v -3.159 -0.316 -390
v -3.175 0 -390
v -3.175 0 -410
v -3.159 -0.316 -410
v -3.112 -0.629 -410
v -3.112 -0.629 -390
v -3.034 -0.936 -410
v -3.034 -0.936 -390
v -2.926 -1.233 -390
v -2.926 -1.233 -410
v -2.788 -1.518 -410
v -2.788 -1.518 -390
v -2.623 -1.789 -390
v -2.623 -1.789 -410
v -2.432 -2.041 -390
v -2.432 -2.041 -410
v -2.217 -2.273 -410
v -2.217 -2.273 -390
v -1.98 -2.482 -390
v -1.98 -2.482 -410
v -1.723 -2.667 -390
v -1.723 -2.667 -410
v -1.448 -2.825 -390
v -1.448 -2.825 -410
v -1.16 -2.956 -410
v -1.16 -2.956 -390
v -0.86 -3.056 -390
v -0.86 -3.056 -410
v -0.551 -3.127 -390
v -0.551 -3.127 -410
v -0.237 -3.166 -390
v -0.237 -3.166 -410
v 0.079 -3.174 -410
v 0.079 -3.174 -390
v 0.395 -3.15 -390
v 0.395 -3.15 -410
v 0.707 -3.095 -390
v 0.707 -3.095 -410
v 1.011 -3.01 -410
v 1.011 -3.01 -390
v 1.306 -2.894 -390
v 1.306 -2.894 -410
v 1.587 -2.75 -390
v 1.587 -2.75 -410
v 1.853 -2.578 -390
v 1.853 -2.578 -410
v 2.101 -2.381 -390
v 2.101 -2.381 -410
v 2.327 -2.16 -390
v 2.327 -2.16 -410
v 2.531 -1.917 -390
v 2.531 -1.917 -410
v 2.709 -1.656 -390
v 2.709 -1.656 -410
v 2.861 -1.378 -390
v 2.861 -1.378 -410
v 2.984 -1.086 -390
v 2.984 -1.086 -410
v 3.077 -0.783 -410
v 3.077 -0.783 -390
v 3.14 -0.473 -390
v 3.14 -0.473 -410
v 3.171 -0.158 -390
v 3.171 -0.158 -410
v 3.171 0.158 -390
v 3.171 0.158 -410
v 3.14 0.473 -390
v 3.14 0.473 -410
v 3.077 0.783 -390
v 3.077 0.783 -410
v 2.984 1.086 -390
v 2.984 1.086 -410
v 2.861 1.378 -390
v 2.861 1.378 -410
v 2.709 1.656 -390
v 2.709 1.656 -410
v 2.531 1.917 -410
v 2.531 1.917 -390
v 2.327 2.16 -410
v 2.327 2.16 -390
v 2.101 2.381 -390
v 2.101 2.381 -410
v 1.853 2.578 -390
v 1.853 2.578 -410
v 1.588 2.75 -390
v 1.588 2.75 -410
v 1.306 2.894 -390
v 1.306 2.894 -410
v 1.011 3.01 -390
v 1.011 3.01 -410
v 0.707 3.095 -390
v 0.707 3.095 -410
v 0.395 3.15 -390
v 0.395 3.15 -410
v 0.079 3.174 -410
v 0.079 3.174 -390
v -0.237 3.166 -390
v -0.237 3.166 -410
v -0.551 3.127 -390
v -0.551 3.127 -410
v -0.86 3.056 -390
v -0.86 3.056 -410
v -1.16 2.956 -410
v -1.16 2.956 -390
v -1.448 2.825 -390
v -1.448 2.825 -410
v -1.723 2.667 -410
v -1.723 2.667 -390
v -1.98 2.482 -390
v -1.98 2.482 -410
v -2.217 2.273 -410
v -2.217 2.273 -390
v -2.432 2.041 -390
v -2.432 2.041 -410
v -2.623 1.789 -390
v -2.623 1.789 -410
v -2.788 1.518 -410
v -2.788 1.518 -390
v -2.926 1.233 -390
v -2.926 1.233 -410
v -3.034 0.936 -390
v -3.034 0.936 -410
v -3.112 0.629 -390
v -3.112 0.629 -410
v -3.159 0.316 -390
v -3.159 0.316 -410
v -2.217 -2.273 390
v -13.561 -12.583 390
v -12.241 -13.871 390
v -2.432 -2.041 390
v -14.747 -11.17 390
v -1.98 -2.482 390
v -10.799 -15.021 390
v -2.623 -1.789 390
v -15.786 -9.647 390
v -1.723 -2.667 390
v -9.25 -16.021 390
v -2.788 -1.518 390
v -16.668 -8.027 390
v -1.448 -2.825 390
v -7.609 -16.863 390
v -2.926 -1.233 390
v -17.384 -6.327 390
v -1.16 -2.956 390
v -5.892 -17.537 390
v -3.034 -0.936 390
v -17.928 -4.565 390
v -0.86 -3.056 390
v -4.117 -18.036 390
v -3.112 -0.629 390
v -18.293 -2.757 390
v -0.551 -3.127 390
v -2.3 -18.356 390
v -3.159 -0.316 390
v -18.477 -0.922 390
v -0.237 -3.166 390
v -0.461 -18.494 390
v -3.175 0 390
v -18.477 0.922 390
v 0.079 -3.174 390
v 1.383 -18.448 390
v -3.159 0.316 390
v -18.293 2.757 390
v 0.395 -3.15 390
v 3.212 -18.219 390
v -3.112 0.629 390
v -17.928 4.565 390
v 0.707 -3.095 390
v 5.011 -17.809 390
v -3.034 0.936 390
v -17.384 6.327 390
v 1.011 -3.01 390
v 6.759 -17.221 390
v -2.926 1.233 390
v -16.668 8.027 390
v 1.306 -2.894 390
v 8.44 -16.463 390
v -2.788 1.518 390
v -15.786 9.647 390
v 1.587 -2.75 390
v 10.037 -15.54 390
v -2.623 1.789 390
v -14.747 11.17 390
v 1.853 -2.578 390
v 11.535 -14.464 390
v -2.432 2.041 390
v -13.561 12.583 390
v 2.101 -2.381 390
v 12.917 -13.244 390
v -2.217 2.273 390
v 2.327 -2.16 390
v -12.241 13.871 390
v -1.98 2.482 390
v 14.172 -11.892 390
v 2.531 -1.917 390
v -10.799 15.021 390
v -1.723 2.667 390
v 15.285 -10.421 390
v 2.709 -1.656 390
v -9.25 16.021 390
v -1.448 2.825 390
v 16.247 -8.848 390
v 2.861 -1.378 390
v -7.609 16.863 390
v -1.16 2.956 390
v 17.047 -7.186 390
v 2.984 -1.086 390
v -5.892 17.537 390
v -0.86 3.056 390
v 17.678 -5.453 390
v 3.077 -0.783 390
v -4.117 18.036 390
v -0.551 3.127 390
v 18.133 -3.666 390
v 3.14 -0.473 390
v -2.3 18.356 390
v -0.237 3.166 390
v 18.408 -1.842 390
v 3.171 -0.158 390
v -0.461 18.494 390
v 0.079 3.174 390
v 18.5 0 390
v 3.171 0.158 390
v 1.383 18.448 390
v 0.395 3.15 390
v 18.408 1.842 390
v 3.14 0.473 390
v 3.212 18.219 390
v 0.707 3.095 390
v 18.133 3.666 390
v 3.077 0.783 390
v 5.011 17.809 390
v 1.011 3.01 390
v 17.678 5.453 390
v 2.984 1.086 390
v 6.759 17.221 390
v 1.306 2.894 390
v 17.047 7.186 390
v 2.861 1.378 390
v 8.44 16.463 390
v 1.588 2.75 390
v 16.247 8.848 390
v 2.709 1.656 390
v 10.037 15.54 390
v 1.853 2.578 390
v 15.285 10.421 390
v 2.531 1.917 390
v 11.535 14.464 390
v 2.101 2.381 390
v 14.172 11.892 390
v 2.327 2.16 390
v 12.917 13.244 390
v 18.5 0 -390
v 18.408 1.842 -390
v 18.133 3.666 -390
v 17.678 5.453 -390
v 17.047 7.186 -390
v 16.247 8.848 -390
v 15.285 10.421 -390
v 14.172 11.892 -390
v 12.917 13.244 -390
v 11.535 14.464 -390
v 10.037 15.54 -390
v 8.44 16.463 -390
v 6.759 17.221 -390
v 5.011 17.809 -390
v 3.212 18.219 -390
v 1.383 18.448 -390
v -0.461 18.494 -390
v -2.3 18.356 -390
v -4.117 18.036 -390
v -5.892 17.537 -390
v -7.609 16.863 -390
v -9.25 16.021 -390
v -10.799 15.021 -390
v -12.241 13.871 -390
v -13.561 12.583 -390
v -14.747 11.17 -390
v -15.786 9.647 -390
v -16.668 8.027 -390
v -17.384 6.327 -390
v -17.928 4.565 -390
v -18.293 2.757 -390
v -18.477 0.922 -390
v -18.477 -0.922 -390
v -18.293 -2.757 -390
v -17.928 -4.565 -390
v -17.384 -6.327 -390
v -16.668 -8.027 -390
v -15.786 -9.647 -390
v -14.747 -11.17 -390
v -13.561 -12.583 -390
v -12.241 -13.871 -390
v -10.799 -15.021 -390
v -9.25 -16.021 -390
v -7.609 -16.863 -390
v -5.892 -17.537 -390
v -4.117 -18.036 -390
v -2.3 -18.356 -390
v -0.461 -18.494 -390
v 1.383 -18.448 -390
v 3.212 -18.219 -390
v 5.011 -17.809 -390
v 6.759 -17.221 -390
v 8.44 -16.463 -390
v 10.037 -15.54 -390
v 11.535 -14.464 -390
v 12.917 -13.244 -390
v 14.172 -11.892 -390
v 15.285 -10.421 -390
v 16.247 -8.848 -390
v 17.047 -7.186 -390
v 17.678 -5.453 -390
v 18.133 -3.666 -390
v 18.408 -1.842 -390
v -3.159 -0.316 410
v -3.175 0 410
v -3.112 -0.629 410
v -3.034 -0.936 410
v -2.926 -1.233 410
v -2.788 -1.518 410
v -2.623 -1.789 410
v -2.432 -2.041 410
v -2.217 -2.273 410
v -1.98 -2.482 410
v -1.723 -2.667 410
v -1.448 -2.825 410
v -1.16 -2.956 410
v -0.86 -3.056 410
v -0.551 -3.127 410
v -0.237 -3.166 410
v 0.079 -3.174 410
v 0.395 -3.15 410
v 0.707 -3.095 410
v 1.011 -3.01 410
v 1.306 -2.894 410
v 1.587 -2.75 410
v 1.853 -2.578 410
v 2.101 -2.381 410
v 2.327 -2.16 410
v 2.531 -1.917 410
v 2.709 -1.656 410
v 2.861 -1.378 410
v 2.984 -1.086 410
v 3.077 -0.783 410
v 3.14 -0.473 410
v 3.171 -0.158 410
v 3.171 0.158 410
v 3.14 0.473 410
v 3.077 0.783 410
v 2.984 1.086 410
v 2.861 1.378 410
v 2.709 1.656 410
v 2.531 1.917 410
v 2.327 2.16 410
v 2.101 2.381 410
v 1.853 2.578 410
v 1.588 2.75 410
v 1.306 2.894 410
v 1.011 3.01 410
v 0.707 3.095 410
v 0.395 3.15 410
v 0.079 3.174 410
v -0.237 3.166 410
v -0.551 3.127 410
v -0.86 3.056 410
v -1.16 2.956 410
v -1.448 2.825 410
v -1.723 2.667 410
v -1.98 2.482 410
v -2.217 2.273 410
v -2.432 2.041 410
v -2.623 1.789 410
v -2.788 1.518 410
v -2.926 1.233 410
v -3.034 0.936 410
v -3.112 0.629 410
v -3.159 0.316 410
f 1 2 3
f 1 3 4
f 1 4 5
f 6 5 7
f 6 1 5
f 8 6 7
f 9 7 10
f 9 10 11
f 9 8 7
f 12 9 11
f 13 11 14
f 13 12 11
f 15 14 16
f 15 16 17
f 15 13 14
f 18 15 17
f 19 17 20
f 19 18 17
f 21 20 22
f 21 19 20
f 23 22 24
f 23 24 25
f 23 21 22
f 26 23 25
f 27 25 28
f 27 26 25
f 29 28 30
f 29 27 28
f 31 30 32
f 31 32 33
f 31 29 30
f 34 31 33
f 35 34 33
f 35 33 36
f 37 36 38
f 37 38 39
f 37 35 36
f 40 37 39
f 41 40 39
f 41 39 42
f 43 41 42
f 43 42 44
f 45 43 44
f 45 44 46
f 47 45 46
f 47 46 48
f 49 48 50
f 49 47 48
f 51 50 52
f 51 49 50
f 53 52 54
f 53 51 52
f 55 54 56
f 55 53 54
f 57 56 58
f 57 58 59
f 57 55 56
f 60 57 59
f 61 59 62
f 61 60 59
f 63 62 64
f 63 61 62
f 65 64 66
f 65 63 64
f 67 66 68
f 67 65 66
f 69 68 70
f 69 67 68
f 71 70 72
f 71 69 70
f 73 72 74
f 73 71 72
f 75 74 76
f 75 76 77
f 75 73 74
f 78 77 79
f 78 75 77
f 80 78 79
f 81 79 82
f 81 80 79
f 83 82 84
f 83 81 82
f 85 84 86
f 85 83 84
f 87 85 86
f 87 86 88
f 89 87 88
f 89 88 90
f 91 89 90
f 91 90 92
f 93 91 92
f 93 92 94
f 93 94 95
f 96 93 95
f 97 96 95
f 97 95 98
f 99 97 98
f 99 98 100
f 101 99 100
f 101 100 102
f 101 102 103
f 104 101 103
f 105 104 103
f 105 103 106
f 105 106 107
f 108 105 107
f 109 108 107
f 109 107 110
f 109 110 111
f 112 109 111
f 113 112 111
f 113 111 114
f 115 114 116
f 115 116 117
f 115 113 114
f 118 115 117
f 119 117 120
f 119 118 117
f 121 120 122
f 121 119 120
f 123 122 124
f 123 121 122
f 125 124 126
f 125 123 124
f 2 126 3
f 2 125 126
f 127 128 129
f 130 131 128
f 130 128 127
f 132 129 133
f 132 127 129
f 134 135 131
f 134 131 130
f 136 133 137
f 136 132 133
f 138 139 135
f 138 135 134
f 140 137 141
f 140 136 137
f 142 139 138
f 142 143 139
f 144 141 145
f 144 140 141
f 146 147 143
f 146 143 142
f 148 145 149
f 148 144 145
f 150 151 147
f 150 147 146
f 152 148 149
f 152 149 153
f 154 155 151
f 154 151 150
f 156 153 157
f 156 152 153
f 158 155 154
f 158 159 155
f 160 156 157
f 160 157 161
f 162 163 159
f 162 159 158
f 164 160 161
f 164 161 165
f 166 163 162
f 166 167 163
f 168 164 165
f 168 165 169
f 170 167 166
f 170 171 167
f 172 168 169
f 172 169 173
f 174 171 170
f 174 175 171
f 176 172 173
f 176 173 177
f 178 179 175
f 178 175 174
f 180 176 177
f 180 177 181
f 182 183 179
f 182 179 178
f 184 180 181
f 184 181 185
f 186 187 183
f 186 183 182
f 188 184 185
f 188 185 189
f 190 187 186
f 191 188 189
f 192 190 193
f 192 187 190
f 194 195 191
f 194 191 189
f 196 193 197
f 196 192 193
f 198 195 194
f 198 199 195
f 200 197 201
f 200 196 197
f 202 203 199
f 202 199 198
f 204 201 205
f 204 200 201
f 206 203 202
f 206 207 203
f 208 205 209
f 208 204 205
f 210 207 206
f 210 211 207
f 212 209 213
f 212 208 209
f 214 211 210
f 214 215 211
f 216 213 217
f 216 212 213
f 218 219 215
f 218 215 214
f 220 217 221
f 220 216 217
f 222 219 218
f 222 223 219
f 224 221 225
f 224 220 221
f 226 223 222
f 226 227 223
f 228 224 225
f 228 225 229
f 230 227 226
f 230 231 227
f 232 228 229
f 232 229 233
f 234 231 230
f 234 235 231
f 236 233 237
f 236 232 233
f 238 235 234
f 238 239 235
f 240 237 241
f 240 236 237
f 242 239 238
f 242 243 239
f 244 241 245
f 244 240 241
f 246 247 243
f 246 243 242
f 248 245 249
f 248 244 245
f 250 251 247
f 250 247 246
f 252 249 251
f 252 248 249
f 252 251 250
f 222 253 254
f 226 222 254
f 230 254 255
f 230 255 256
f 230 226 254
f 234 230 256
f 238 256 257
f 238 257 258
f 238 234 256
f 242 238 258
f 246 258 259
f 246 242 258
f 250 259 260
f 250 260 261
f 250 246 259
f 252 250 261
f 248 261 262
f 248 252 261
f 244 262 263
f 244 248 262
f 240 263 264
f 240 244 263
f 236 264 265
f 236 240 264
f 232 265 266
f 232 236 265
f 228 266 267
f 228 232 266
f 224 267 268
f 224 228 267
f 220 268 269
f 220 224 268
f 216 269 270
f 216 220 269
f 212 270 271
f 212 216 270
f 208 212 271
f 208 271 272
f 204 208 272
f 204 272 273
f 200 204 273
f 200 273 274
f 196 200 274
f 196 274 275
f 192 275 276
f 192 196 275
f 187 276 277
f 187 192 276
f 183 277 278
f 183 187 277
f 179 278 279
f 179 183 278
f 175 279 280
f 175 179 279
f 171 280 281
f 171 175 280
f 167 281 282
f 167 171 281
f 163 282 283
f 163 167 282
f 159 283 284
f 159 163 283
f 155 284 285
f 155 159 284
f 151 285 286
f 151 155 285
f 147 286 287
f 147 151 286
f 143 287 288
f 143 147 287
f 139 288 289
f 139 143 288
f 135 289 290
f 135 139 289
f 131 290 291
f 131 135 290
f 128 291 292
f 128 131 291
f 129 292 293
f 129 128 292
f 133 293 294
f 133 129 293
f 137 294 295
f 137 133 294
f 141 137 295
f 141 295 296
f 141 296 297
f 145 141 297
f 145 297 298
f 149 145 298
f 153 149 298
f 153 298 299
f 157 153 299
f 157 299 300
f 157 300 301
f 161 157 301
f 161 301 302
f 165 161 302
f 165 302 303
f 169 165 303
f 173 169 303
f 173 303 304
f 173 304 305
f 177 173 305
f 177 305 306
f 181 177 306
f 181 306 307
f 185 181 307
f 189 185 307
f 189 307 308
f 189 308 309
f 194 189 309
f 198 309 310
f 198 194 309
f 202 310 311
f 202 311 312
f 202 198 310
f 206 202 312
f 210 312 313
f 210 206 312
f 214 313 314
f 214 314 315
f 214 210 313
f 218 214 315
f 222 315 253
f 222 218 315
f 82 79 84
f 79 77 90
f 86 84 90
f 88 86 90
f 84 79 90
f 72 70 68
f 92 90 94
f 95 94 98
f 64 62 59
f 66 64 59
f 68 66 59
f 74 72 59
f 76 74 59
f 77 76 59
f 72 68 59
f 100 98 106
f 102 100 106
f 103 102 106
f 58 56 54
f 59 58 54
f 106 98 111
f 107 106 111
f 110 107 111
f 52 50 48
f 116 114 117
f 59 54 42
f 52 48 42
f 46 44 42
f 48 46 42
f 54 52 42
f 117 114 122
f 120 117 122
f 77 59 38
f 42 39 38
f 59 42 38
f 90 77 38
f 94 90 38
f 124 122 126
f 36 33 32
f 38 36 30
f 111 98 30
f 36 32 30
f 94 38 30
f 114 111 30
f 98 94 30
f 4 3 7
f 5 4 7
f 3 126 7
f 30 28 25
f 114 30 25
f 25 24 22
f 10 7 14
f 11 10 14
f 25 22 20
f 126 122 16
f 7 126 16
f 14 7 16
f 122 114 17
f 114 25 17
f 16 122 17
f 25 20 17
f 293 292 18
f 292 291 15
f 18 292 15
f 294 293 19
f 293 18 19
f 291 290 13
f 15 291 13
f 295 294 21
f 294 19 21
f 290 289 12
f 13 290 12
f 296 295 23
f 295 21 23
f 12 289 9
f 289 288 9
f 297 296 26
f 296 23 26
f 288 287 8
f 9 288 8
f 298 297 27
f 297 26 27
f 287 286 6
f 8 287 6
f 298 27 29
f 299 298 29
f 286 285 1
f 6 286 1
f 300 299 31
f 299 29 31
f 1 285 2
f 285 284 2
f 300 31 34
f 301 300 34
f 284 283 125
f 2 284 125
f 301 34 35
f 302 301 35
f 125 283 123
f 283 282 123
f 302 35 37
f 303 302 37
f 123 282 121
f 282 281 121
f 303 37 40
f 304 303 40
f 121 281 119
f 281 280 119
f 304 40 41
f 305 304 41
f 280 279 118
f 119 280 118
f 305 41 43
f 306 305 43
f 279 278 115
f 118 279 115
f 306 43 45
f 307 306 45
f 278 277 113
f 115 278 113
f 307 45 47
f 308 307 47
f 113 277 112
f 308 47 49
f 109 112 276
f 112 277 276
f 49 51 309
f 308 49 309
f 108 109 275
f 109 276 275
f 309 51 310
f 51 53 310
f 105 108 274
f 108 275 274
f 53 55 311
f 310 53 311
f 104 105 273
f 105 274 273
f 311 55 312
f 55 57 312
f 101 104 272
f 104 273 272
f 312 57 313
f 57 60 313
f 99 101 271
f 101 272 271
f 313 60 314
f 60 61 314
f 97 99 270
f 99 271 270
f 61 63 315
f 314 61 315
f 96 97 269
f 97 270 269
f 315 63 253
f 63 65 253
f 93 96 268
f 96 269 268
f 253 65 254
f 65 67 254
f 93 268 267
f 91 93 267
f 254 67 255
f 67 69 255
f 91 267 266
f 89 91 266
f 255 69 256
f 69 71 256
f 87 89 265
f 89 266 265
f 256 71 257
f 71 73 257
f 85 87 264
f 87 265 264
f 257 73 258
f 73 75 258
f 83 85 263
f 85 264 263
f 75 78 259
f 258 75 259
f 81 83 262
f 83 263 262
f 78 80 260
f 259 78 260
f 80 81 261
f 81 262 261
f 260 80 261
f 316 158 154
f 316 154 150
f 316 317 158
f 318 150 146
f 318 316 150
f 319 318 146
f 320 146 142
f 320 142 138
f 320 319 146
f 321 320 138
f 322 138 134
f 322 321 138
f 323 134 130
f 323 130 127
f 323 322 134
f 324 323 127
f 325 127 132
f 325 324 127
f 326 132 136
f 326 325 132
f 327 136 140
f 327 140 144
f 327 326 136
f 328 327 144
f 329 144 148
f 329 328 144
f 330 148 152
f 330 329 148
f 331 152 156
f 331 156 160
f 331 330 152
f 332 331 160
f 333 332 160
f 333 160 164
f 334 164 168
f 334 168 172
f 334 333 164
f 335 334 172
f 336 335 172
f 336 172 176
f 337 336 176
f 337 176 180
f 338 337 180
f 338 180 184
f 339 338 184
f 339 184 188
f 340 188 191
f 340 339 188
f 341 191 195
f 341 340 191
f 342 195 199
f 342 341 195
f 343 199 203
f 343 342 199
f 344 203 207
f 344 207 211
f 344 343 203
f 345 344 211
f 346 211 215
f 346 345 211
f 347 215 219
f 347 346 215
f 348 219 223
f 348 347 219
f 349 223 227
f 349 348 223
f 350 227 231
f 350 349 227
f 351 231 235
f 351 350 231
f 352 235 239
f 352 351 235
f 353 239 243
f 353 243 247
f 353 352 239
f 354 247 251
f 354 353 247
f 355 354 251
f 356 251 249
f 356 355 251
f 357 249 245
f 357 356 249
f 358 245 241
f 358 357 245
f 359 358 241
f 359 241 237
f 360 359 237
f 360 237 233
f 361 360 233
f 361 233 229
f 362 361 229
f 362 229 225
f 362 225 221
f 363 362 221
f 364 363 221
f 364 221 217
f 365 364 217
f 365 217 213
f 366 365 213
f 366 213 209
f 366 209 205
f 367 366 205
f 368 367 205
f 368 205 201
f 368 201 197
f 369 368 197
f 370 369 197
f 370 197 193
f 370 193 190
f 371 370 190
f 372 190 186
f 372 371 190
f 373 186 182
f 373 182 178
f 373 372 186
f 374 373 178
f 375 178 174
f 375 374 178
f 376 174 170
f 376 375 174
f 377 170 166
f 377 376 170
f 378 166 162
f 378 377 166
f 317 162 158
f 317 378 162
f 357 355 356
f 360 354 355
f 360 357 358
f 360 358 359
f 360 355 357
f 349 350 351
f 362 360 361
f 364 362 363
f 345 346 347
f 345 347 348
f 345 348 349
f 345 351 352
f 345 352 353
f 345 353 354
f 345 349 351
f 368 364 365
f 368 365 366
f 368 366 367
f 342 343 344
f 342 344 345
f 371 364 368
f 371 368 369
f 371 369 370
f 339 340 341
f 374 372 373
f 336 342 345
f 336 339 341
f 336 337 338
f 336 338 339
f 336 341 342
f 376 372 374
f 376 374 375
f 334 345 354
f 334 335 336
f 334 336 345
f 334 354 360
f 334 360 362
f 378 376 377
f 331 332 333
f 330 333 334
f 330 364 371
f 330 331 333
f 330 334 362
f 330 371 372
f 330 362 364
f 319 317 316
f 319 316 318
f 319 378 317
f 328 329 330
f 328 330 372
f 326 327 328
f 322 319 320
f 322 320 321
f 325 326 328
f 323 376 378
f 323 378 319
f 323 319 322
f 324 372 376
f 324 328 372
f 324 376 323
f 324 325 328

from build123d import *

# Parameters (mm, degrees)
SKETCH1_R           = 18.5
BOSS_EXTRUDE1_DEPTH = 390
SKETCH2_R           = 3.175
BOSS_EXTRUDE2_DEPTH = 410


with BuildPart() as part:
    # Sketch1 → Boss-Extrude1 (new, symmetric)
    with BuildSketch(Plane.XY):
        Circle(SKETCH1_R)
    extrude(amount=BOSS_EXTRUDE1_DEPTH, both=True)

    # Sketch2 → Boss-Extrude2 (add, symmetric)
    with BuildSketch(Plane.XY):
        with Locations(Location((0, 0, 0), (0, 0, 180))):
            Circle(SKETCH2_R)
    extrude(amount=BOSS_EXTRUDE2_DEPTH, both=True)


solid = part.part
